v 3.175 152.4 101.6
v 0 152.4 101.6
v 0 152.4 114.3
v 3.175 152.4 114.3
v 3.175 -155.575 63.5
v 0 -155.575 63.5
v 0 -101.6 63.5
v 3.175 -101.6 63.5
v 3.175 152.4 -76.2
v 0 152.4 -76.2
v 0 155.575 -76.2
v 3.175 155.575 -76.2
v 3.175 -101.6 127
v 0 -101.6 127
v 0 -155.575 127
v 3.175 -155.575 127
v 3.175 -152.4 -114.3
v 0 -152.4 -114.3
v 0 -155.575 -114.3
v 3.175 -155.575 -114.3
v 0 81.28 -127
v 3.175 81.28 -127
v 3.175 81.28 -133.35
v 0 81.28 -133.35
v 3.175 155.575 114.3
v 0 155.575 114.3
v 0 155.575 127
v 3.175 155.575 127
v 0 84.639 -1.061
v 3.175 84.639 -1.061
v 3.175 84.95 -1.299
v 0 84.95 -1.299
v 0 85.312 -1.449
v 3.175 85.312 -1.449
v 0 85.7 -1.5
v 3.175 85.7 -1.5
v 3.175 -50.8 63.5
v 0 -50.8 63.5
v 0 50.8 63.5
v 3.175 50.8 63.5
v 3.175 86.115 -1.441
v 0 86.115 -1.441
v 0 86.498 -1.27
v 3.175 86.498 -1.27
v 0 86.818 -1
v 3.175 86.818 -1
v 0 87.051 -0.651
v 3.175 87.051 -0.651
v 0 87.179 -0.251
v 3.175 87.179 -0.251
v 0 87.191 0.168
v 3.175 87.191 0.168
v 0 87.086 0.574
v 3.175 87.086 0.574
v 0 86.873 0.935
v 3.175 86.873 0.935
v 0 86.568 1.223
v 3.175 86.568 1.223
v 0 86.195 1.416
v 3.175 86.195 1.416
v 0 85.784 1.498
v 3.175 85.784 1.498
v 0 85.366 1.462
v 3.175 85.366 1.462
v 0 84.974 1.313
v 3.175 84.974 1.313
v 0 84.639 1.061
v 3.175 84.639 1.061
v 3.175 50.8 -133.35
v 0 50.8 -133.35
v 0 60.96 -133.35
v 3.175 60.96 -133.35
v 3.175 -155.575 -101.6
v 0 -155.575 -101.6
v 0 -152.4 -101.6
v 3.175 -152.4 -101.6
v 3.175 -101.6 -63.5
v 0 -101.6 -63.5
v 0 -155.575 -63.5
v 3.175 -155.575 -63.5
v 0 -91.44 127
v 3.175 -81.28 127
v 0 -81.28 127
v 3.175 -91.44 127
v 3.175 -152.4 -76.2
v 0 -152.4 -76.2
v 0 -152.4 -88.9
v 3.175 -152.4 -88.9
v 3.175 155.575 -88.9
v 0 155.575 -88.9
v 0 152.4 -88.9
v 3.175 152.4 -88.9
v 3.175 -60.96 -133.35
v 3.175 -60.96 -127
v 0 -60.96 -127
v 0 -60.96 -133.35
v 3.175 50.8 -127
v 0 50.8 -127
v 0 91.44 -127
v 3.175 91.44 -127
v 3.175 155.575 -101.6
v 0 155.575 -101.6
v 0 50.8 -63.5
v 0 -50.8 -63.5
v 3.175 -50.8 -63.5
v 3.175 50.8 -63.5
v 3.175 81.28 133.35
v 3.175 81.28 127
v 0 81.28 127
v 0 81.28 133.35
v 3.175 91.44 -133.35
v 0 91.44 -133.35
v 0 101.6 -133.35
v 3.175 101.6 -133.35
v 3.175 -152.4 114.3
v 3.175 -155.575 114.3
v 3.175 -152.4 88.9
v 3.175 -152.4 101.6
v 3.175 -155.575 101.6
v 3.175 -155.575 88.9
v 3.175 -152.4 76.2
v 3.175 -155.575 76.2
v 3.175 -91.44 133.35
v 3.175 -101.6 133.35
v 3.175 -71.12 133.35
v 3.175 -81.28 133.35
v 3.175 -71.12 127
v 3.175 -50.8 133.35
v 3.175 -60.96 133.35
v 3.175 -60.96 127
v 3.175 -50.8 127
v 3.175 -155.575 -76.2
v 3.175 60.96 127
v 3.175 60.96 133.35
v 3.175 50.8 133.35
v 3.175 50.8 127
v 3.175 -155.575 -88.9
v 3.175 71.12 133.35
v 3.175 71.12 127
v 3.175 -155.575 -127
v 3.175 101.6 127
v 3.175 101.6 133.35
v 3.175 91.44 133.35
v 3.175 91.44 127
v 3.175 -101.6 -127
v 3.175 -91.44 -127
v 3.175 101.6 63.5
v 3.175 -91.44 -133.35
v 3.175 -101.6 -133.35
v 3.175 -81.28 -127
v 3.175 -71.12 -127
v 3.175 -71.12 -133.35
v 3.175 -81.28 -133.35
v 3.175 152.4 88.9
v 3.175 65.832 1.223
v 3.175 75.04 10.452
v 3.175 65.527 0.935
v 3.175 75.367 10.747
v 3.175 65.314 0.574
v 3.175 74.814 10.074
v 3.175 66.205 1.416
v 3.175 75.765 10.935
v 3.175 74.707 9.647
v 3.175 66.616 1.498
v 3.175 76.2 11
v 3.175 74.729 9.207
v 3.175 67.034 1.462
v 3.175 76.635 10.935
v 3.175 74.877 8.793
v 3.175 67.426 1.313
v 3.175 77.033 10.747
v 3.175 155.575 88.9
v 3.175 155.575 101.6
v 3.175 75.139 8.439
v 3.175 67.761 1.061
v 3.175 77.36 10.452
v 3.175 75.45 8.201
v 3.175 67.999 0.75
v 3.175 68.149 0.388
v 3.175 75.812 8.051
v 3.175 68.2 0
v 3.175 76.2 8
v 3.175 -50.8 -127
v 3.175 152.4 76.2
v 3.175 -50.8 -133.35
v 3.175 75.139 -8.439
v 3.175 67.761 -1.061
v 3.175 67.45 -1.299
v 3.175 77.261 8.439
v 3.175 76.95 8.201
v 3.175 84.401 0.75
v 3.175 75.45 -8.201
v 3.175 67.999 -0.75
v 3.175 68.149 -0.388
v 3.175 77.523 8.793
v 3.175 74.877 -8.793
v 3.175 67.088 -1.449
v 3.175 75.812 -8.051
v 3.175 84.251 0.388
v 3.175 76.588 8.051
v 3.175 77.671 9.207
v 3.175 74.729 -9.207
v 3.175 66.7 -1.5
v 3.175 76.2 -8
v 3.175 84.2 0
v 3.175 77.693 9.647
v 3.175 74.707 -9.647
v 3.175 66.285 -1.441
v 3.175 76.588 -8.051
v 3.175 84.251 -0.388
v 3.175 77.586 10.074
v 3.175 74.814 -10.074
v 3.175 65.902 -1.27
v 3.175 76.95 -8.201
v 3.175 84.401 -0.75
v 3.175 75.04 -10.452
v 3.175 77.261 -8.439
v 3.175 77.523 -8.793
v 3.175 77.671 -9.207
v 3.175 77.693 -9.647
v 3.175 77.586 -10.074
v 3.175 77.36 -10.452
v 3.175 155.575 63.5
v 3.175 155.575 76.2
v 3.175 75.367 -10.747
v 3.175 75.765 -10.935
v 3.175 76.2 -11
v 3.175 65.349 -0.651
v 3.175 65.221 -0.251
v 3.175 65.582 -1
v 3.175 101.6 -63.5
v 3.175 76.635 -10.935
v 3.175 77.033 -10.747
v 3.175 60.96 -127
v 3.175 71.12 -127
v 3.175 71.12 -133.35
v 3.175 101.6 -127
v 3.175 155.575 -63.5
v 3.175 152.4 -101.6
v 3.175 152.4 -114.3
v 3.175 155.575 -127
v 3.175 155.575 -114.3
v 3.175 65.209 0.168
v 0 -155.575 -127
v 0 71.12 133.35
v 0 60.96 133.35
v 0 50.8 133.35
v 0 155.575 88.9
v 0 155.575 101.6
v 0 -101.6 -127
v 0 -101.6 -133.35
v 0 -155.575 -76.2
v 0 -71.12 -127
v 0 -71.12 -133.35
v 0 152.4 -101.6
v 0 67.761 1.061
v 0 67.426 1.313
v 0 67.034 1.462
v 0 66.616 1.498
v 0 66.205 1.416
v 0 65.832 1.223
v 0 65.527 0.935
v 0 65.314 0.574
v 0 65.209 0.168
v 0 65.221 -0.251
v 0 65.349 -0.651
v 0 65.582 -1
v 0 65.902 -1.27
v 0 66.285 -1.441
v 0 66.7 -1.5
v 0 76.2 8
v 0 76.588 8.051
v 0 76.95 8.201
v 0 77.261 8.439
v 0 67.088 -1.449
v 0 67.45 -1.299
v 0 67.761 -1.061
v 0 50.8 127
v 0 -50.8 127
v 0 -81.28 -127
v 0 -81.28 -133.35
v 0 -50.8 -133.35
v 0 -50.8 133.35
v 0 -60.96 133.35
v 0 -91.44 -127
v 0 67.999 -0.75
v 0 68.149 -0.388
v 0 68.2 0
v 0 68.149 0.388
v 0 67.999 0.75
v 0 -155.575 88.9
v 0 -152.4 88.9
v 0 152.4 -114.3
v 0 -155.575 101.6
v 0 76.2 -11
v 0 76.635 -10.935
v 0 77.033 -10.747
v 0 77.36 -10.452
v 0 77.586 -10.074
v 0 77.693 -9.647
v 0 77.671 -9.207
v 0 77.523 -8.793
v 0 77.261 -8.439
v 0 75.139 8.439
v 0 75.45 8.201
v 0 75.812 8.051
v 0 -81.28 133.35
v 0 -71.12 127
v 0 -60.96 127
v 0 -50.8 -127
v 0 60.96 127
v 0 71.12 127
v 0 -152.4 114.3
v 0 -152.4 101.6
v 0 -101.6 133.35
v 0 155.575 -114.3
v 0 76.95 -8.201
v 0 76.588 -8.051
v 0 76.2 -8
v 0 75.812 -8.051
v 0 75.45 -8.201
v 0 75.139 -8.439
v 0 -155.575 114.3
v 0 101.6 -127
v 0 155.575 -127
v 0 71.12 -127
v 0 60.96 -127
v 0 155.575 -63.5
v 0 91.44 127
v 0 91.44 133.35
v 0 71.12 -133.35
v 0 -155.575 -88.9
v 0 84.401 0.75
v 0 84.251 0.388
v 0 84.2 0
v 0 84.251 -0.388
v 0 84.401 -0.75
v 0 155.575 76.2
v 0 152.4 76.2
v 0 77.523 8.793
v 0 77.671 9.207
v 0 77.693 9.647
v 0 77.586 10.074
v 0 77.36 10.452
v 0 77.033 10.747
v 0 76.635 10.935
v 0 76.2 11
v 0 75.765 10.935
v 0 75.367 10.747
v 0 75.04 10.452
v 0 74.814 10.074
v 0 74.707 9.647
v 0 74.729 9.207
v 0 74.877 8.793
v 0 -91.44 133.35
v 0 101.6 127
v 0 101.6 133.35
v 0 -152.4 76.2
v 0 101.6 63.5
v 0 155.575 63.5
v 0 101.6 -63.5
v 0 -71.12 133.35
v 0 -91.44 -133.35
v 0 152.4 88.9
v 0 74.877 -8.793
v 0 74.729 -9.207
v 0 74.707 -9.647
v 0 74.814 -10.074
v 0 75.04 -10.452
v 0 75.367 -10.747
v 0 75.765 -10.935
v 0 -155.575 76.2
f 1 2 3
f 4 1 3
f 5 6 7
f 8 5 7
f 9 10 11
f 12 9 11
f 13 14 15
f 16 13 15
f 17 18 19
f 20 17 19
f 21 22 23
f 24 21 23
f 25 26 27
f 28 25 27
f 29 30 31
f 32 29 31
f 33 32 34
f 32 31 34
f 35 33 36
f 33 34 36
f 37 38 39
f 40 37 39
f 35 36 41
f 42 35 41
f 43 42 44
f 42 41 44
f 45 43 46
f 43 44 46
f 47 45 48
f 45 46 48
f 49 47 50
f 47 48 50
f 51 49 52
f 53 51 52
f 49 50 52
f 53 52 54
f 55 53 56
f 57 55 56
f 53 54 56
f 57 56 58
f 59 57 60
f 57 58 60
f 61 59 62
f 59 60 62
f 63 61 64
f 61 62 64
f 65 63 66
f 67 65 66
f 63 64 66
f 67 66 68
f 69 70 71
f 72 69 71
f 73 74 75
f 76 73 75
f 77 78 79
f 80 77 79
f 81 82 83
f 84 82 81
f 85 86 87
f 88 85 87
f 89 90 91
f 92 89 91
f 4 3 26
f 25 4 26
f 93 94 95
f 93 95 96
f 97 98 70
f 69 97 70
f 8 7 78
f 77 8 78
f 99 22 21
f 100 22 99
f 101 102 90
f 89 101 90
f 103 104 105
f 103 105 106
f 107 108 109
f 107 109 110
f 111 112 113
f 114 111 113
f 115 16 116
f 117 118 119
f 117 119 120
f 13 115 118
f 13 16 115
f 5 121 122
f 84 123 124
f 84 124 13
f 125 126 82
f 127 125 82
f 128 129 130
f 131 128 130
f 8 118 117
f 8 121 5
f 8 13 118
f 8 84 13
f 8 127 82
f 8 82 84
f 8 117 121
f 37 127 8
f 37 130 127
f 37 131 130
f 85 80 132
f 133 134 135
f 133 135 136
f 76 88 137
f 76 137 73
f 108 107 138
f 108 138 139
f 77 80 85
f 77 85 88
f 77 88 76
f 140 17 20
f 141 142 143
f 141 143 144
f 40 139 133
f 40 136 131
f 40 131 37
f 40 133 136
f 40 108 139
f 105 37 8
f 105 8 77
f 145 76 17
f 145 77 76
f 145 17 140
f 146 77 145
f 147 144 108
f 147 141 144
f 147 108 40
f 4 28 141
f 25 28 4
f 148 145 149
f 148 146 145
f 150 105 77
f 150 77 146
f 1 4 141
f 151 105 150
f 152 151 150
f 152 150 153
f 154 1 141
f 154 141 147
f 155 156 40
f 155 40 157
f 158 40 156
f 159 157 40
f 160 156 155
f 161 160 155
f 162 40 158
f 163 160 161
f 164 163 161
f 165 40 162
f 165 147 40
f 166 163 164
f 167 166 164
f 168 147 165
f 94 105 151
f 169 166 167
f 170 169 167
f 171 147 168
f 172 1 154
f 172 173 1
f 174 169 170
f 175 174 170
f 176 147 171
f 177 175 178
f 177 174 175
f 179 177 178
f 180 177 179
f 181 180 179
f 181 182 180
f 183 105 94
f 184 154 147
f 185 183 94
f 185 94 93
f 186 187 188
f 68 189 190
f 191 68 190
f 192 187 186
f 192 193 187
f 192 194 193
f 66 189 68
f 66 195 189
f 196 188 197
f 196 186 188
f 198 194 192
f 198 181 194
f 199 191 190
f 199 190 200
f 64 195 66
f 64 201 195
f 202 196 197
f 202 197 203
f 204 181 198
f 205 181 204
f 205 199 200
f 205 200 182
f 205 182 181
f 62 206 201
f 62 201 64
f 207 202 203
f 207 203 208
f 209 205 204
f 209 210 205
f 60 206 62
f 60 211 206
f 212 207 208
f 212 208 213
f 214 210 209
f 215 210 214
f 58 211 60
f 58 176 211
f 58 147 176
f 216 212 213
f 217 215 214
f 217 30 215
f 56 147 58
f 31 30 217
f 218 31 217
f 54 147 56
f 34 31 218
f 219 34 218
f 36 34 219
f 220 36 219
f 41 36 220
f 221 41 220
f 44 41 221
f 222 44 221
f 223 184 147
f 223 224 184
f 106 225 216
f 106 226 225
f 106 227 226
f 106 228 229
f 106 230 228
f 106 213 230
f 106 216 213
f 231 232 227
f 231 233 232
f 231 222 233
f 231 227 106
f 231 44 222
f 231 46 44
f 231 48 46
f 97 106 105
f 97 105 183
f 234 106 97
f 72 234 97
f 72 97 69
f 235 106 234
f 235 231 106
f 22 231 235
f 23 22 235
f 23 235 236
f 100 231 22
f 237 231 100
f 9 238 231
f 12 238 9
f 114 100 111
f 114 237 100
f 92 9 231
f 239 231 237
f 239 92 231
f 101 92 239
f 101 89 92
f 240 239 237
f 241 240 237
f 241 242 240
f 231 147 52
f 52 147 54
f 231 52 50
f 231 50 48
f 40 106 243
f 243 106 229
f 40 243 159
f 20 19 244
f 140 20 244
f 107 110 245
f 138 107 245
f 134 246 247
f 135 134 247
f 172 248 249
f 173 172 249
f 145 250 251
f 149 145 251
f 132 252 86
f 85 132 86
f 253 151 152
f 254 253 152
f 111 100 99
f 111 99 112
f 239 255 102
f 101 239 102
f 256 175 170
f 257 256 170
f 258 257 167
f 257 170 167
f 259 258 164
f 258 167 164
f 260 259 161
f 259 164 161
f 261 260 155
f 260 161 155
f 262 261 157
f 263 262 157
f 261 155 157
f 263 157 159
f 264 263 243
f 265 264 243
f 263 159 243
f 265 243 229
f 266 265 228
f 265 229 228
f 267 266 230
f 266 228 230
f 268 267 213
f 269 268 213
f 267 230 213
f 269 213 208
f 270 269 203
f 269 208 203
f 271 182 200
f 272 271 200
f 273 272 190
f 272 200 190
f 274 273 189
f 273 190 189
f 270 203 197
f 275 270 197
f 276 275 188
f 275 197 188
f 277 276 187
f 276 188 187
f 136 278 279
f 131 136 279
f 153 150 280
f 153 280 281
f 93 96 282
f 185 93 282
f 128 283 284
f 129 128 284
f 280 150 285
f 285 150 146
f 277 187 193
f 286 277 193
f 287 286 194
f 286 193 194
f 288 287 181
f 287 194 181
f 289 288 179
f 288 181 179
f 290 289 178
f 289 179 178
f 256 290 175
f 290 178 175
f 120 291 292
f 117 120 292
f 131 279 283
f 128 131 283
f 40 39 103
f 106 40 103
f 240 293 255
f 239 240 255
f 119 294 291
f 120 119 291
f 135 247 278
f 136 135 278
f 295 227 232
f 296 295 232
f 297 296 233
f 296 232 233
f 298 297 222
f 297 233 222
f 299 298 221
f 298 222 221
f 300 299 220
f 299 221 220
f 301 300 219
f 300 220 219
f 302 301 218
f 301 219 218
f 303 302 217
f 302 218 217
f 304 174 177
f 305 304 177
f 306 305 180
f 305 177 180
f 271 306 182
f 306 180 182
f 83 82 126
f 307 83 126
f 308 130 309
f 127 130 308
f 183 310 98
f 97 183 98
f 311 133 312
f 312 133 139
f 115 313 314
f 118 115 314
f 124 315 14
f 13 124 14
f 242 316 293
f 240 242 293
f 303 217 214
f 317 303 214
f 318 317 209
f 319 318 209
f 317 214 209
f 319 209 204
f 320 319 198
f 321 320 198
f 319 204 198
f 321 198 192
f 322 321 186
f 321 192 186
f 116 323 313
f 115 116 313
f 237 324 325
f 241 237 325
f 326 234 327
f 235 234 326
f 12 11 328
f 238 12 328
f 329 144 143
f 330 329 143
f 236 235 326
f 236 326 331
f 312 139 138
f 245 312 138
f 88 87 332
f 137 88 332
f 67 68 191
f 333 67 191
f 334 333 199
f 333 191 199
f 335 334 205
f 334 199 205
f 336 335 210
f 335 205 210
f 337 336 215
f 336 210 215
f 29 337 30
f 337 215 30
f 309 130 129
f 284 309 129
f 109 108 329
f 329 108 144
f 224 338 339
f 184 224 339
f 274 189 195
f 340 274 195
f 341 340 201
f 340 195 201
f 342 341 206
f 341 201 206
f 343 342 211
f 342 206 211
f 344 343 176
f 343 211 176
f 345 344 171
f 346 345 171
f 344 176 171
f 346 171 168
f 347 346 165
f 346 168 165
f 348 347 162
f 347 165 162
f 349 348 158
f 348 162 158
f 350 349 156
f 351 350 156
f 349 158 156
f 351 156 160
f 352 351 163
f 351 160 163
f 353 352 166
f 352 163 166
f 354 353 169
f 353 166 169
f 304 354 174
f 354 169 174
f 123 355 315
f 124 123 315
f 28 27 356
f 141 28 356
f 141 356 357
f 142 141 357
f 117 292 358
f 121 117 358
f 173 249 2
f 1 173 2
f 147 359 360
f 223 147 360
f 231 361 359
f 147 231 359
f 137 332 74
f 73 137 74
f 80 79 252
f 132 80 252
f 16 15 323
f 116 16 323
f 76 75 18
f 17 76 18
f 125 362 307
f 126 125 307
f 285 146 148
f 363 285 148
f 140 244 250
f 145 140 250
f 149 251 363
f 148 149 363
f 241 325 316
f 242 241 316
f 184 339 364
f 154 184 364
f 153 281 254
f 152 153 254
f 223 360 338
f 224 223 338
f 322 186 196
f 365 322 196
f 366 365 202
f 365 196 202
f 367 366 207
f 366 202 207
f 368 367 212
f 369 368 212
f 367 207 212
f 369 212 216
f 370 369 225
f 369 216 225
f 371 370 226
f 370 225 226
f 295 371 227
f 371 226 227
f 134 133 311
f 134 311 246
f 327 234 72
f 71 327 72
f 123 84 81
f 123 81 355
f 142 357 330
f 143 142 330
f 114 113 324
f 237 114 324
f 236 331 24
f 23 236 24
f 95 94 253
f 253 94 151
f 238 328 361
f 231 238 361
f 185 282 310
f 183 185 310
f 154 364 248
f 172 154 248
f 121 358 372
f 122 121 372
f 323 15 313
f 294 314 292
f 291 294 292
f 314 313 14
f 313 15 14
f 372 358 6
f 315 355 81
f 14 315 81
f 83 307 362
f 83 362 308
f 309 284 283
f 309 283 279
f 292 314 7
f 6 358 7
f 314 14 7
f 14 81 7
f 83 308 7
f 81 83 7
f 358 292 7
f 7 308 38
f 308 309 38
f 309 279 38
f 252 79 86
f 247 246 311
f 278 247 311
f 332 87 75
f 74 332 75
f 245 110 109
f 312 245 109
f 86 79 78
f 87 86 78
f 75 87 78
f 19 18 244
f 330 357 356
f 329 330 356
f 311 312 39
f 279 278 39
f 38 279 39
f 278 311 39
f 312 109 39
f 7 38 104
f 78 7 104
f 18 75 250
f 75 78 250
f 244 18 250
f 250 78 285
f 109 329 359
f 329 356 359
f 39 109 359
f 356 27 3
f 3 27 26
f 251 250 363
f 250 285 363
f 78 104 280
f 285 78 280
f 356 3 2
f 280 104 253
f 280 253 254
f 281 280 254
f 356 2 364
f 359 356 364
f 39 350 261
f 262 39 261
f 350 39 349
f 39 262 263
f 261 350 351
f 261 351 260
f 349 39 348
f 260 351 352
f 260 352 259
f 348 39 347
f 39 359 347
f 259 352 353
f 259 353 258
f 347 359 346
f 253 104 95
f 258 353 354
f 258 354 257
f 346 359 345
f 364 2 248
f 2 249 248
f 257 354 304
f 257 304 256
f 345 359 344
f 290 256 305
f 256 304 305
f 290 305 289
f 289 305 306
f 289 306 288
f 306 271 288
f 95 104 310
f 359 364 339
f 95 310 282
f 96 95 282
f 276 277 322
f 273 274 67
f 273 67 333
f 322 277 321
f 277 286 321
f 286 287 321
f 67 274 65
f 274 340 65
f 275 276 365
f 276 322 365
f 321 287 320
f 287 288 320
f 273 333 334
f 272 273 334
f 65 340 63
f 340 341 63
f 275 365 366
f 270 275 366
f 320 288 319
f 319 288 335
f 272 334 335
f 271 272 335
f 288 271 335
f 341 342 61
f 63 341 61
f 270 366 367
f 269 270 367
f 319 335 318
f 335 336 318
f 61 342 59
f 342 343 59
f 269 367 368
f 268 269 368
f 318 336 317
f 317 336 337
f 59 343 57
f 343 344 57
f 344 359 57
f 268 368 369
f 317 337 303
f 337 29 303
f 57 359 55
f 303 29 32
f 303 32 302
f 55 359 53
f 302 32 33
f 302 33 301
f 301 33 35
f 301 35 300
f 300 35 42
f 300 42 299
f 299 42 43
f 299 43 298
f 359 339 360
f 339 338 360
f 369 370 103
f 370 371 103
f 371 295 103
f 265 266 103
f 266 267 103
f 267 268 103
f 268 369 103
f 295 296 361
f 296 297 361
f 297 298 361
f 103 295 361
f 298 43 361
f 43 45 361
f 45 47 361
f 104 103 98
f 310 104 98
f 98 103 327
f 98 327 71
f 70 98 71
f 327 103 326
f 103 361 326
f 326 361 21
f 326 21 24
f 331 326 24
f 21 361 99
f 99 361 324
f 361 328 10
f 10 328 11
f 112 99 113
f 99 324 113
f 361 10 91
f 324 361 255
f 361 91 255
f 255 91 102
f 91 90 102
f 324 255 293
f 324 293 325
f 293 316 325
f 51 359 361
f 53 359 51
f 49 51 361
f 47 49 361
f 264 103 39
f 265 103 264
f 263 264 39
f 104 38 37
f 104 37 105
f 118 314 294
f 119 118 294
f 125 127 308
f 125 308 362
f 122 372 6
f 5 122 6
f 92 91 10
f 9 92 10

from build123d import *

# Parameters (mm, degrees)
SKETCH1_W               = 127
SKETCH1_H               = 101.6
BOSS_EXTRUDE1_DEPTH     = 3.175
CUT_EXTRUDE3_DEPTH      = 3.175
SKETCH4_W               = 6.35
SKETCH4_H               = 10.16
CUT_EXTRUDE4_DEPTH      = 3.175
MIRROR4_COPY_1_SKETCH_W = 6.35
MIRROR4_COPY_1_SKETCH_H = 10.16
MIRROR4_COPY_1_DEPTH    = 3.175


with BuildPart() as part:
    # Sketch1 → Boss-Extrude1 (new body)
    with BuildSketch(Plane(origin=(0, 0, 0), x_dir=(0, 0, -1), z_dir=(1, 0, 0))):
        Polygon((-127, -101.6), (-127, -155.575), (-114.3, -155.575), (-114.3, -152.4), (-101.6, -152.4), (-101.6, -155.575), (-88.9, -155.575), (-88.9, -152.4), (-76.2, -152.4), (-76.2, -155.575), (-63.5, -155.575), (-63.5, -101.6), (63.5, -101.6), (63.5, -155.575), (76.2, -155.575), (76.2, -152.4), (88.9, -152.4), (88.9, -155.575), (101.6, -155.575), (101.6, -152.4), (114.3, -152.4), (114.3, -155.575), (127, -155.575), (127, -101.6), (133.35, -101.6), (133.35, -50.8), (127, -50.8), (127, 50.8), (133.35, 50.8), (133.35, 101.6), (127, 101.6), (127, 155.575), (114.3, 155.575), (114.3, 152.4), (101.6, 152.4), (101.6, 155.575), (88.9, 155.575), (88.9, 152.4), (76.2, 152.4), (76.2, 155.575), (63.5, 155.575), (63.5, 101.6), (-63.5, 101.6), (-63.5, 155.575), (-76.2, 155.575), (-76.2, 152.4), (-88.9, 152.4), (-88.9, 155.575), (-101.6, 155.575), (-101.6, 152.4), (-114.3, 152.4), (-114.3, 155.575), (-127, 155.575), (-127, 101.6), (-133.35, 101.6), (-133.35, 50.8), (-127, 50.8), (-127, -50.8), (-133.35, -50.8), (-133.35, -101.6), align=None)
        Rectangle(SKETCH1_W, SKETCH1_H, mode=Mode.SUBTRACT)
    extrude(amount=BOSS_EXTRUDE1_DEPTH)

    # Sketch3 → Cut-Extrude3 (cut)
    with BuildSketch(Plane(origin=(3.175, 0, 0), x_dir=(0, 0, -1), z_dir=(1, 0, 0))):
        with BuildLine():
            Line((1.060660172, 84.639339828), (0, 85.7))
            Line((0, 85.7), (-1.060660172, 84.639339828))
            ThreePointArc((-1.060660172, 84.639339828), (0, 84.2), (1.060660172, 84.639339828))
        make_face()
        with BuildLine():
            Line((-1.060660172, 84.639339828), (0, 85.7))
            Line((0, 85.7), (1.060660172, 84.639339828))
            ThreePointArc((1.060660172, 84.639339828), (1.385819299, 85.125974851), (1.5, 85.7))
            ThreePointArc((1.5, 85.7), (-0.574025149, 87.085819299), (-1.060660172, 84.639339828))
        make_face()
        with BuildLine():
            ThreePointArc((1.060660172, 67.760660172), (0, 68.2), (-1.060660172, 67.760660172))
            Line((-1.060660172, 67.760660172), (0, 66.7))
            Line((0, 66.7), (1.060660172, 67.760660172))
        make_face()
        with BuildLine():
            Line((0, 66.7), (-1.060660172, 67.760660172))
            ThreePointArc((-1.060660172, 67.760660172), (-0.574025149, 65.314180701), (1.5, 66.7))
            ThreePointArc((1.5, 66.7), (1.385819299, 67.274025149), (1.060660172, 67.760660172))
            Line((1.060660172, 67.760660172), (0, 66.7))
        make_face()
        with BuildLine():
            ThreePointArc((11, 76.2), (10.074025149, 77.585819299), (8.439339828, 77.260660172))
            Line((8.439339828, 77.260660172), (9.5, 76.2))
            Line((9.5, 76.2), (8.439339828, 75.139339828))
            ThreePointArc((8.439339828, 75.139339828), (10.074025149, 74.814180701), (11, 76.2))
        make_face()
        with BuildLine():
            Line((9.5, 76.2), (8.439339828, 77.260660172))
            ThreePointArc((8.439339828, 77.260660172), (8, 76.2), (8.439339828, 75.139339828))
            Line((8.439339828, 75.139339828), (9.5, 76.2))
        make_face()
        with BuildLine():
            ThreePointArc((-8, 76.2), (-8.114180701, 76.774025149), (-8.439339828, 77.260660172))
            Line((-8.439339828, 77.260660172), (-9.5, 76.2))
            Line((-9.5, 76.2), (-8.439339828, 75.139339828))
            ThreePointArc((-8.439339828, 75.139339828), (-8.114180701, 75.625974851), (-8, 76.2))
        make_face()
        with BuildLine():
            Line((-9.5, 76.2), (-8.439339828, 77.260660172))
            ThreePointArc((-8.439339828, 77.260660172), (-11, 76.2), (-8.439339828, 75.139339828))
            Line((-8.439339828, 75.139339828), (-9.5, 76.2))
        make_face()
    extrude(amount=-CUT_EXTRUDE3_DEPTH, mode=Mode.SUBTRACT)

    # Sketch4 → Cut-Extrude4 (cut)
    with BuildSketch(Plane(origin=(3.175, 0, 0), x_dir=(0, 0, -1), z_dir=(1, 0, 0))):
        with Locations((130.175, 86.36)):
            Rectangle(SKETCH4_W, SKETCH4_H)
        with Locations((130.175, 66.04)):
            Rectangle(SKETCH4_W, SKETCH4_H)
    cut_extrude4 = extrude(amount=-CUT_EXTRUDE4_DEPTH, mode=Mode.SUBTRACT)

    # Mirror3: Cut-Extrude4 across plane
    add(cut_extrude4.mirror(Plane.ZX), mode=Mode.SUBTRACT)

    # Mirror4: Cut-Extrude4 across plane
    add(cut_extrude4.mirror(Plane.XY), mode=Mode.SUBTRACT)

    # Mirror4 copy 1 sketch → Mirror4 copy 1 (cut)
    with BuildSketch(Plane(origin=(3.175, 0, 0), x_dir=(0, 0, 1), z_dir=(1, 0, 0))):
        with Locations((130.175, 86.36)):
            Rectangle(MIRROR4_COPY_1_SKETCH_W, MIRROR4_COPY_1_SKETCH_H)
        with Locations((130.175, 66.04)):
            Rectangle(MIRROR4_COPY_1_SKETCH_W, MIRROR4_COPY_1_SKETCH_H)
    extrude(amount=-MIRROR4_COPY_1_DEPTH, mode=Mode.SUBTRACT)


solid = part.part
